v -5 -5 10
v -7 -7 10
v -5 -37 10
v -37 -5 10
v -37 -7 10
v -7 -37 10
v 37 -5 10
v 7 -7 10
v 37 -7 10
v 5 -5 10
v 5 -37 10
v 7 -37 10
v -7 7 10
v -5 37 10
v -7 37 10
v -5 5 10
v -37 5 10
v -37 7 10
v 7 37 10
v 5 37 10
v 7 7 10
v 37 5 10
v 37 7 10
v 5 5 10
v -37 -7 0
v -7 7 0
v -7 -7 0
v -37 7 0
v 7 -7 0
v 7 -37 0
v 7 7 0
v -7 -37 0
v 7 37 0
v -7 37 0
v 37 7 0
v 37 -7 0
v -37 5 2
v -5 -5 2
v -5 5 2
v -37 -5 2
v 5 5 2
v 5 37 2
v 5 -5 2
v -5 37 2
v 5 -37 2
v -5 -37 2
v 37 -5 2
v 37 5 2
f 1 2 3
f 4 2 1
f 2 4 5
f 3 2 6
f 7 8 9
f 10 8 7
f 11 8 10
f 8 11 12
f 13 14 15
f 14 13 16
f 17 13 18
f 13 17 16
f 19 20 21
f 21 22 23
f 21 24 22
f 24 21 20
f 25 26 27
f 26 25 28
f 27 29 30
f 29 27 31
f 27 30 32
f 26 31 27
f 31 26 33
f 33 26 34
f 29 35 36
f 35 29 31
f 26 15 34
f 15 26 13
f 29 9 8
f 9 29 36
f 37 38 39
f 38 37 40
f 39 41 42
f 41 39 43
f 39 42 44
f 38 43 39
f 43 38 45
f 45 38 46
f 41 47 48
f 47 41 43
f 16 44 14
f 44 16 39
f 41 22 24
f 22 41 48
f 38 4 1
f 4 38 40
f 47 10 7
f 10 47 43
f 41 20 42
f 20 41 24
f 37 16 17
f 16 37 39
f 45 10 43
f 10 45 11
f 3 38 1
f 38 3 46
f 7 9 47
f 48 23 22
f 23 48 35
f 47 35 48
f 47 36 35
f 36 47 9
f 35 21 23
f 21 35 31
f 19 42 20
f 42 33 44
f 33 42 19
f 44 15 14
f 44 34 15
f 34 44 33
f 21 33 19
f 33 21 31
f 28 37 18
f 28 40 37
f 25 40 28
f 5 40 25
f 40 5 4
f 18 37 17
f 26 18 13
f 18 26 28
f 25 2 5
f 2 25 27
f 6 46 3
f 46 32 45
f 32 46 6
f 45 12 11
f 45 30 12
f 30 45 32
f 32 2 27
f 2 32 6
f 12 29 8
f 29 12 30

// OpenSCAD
// Крестообразный паз для соединения 4х стенок
// Модульная конструкция: центральное основание + 4 рукава

// Параметры (все размеры в мм)
center_size = 10;     // Размер центрального квадрата (внутри)
sleeve_length = 30;   // Длина рукава
groove_width = 10;    // Ширина паза (внутри) - для фанеры 9.3мм
wall_height = 10;     // Высота стенок
wall_thickness = 2;   // Толщина стенок

// Вычисляемые размеры
total_width = groove_width + 2 * wall_thickness;  // 14 мм
center_total = center_size + 2 * wall_thickness;  // 14 мм (размер центра со стенками)

// 1. Метод: нарисовать основание (центральный квадрат)
module draw_base() {
    difference() {
        // Внешний куб
        cube([center_total, center_total, wall_height]);

        // Вычитаем внутренний паз (сквозной)
        translate([wall_thickness, wall_thickness, wall_thickness])
            cube([center_size, center_size, wall_height]);
    }
}

// Модуль для создания одного рукава (паза)
module single_sleeve() {
    difference() {
        // Внешний блок
        cube([sleeve_length, total_width, wall_height]);

        // Вычитаем внутренний паз
        translate([0, wall_thickness, wall_thickness])
            cube([sleeve_length, groove_width, wall_height]);
    }
}

// Метод: вырезать отверстие в стенке основания
// side: 0=право, 1=верх, 2=лево, 3=низ
module cut_wall_opening(side) {
    if (side == 0) {
        // Право - вырезаем правую стенку
        translate([center_total - wall_thickness - 0.1, wall_thickness, wall_thickness])
            cube([wall_thickness + 0.2, groove_width, wall_height]);
    } else if (side == 1) {
        // Верх - вырезаем верхнюю стенку
        translate([wall_thickness, center_total - wall_thickness - 0.1, wall_thickness])
            cube([groove_width, wall_thickness + 0.2, wall_height]);
    } else if (side == 2) {
        // Лево - вырезаем левую стенку
        translate([-0.1, wall_thickness, wall_thickness])
            cube([wall_thickness + 0.2, groove_width, wall_height]);
    } else if (side == 3) {
        // Низ - вырезаем нижнюю стенку
        translate([wall_thickness, -0.1, wall_thickness])
            cube([groove_width, wall_thickness + 0.2, wall_height]);
    }
}

// 2. Метод: прицепить рукав к основанию
// side: 0=право, 1=верх, 2=лево, 3=низ
module attach_sleeve(side) {
    if (side == 0) {
        // Право (+X)
        translate([center_total, center_total/2 - total_width/2, 0])
            single_sleeve();
    } else if (side == 1) {
        // Верх (+Y)
        translate([center_total/2 + total_width/2, center_total, 0])
            rotate([0, 0, 90])
                single_sleeve();
    } else if (side == 2) {
        // Лево (-X)
        translate([-sleeve_length, center_total/2 - total_width/2, 0])
            single_sleeve();
    } else if (side == 3) {
        // Низ (-Y)
        translate([center_total/2 + total_width/2, -sleeve_length, 0])
            rotate([0, 0, 90])
                single_sleeve();
    }
}

// Собираем крестообразную конструкцию
// Центр основания в начале координат
translate([-center_total/2, -center_total/2, 0]) {
    union() {
        // Центральное основание с вырезами для рукавов
        difference() {
            draw_base();

            // Вырезаем отверстия в стенках для всех рукавов
            cut_wall_opening(0);  // Право
            cut_wall_opening(1);  // Верх
            cut_wall_opening(2);  // Лево
            cut_wall_opening(3);  // Низ
        }

        // Прицепляем 4 рукава
        attach_sleeve(0);  // Право
        attach_sleeve(1);  // Верх
        attach_sleeve(2);  // Лево
        attach_sleeve(3);  // Низ
    }
}

// Информация для проверки
echo("=== Размеры крестообразного паза ===");
echo("Центральный квадрат (внутри):", center_size, "x", center_size, "мм");
echo("Центр со стенками:", center_total, "x", center_total, "мм");
echo("Длина рукава:", sleeve_length, "мм");
echo("Ширина паза (внутри):", groove_width, "мм");
echo("Общая ширина рукава:", total_width, "мм");
echo("Высота стенок:", wall_height, "мм");
echo("Толщина стенок:", wall_thickness, "мм");
